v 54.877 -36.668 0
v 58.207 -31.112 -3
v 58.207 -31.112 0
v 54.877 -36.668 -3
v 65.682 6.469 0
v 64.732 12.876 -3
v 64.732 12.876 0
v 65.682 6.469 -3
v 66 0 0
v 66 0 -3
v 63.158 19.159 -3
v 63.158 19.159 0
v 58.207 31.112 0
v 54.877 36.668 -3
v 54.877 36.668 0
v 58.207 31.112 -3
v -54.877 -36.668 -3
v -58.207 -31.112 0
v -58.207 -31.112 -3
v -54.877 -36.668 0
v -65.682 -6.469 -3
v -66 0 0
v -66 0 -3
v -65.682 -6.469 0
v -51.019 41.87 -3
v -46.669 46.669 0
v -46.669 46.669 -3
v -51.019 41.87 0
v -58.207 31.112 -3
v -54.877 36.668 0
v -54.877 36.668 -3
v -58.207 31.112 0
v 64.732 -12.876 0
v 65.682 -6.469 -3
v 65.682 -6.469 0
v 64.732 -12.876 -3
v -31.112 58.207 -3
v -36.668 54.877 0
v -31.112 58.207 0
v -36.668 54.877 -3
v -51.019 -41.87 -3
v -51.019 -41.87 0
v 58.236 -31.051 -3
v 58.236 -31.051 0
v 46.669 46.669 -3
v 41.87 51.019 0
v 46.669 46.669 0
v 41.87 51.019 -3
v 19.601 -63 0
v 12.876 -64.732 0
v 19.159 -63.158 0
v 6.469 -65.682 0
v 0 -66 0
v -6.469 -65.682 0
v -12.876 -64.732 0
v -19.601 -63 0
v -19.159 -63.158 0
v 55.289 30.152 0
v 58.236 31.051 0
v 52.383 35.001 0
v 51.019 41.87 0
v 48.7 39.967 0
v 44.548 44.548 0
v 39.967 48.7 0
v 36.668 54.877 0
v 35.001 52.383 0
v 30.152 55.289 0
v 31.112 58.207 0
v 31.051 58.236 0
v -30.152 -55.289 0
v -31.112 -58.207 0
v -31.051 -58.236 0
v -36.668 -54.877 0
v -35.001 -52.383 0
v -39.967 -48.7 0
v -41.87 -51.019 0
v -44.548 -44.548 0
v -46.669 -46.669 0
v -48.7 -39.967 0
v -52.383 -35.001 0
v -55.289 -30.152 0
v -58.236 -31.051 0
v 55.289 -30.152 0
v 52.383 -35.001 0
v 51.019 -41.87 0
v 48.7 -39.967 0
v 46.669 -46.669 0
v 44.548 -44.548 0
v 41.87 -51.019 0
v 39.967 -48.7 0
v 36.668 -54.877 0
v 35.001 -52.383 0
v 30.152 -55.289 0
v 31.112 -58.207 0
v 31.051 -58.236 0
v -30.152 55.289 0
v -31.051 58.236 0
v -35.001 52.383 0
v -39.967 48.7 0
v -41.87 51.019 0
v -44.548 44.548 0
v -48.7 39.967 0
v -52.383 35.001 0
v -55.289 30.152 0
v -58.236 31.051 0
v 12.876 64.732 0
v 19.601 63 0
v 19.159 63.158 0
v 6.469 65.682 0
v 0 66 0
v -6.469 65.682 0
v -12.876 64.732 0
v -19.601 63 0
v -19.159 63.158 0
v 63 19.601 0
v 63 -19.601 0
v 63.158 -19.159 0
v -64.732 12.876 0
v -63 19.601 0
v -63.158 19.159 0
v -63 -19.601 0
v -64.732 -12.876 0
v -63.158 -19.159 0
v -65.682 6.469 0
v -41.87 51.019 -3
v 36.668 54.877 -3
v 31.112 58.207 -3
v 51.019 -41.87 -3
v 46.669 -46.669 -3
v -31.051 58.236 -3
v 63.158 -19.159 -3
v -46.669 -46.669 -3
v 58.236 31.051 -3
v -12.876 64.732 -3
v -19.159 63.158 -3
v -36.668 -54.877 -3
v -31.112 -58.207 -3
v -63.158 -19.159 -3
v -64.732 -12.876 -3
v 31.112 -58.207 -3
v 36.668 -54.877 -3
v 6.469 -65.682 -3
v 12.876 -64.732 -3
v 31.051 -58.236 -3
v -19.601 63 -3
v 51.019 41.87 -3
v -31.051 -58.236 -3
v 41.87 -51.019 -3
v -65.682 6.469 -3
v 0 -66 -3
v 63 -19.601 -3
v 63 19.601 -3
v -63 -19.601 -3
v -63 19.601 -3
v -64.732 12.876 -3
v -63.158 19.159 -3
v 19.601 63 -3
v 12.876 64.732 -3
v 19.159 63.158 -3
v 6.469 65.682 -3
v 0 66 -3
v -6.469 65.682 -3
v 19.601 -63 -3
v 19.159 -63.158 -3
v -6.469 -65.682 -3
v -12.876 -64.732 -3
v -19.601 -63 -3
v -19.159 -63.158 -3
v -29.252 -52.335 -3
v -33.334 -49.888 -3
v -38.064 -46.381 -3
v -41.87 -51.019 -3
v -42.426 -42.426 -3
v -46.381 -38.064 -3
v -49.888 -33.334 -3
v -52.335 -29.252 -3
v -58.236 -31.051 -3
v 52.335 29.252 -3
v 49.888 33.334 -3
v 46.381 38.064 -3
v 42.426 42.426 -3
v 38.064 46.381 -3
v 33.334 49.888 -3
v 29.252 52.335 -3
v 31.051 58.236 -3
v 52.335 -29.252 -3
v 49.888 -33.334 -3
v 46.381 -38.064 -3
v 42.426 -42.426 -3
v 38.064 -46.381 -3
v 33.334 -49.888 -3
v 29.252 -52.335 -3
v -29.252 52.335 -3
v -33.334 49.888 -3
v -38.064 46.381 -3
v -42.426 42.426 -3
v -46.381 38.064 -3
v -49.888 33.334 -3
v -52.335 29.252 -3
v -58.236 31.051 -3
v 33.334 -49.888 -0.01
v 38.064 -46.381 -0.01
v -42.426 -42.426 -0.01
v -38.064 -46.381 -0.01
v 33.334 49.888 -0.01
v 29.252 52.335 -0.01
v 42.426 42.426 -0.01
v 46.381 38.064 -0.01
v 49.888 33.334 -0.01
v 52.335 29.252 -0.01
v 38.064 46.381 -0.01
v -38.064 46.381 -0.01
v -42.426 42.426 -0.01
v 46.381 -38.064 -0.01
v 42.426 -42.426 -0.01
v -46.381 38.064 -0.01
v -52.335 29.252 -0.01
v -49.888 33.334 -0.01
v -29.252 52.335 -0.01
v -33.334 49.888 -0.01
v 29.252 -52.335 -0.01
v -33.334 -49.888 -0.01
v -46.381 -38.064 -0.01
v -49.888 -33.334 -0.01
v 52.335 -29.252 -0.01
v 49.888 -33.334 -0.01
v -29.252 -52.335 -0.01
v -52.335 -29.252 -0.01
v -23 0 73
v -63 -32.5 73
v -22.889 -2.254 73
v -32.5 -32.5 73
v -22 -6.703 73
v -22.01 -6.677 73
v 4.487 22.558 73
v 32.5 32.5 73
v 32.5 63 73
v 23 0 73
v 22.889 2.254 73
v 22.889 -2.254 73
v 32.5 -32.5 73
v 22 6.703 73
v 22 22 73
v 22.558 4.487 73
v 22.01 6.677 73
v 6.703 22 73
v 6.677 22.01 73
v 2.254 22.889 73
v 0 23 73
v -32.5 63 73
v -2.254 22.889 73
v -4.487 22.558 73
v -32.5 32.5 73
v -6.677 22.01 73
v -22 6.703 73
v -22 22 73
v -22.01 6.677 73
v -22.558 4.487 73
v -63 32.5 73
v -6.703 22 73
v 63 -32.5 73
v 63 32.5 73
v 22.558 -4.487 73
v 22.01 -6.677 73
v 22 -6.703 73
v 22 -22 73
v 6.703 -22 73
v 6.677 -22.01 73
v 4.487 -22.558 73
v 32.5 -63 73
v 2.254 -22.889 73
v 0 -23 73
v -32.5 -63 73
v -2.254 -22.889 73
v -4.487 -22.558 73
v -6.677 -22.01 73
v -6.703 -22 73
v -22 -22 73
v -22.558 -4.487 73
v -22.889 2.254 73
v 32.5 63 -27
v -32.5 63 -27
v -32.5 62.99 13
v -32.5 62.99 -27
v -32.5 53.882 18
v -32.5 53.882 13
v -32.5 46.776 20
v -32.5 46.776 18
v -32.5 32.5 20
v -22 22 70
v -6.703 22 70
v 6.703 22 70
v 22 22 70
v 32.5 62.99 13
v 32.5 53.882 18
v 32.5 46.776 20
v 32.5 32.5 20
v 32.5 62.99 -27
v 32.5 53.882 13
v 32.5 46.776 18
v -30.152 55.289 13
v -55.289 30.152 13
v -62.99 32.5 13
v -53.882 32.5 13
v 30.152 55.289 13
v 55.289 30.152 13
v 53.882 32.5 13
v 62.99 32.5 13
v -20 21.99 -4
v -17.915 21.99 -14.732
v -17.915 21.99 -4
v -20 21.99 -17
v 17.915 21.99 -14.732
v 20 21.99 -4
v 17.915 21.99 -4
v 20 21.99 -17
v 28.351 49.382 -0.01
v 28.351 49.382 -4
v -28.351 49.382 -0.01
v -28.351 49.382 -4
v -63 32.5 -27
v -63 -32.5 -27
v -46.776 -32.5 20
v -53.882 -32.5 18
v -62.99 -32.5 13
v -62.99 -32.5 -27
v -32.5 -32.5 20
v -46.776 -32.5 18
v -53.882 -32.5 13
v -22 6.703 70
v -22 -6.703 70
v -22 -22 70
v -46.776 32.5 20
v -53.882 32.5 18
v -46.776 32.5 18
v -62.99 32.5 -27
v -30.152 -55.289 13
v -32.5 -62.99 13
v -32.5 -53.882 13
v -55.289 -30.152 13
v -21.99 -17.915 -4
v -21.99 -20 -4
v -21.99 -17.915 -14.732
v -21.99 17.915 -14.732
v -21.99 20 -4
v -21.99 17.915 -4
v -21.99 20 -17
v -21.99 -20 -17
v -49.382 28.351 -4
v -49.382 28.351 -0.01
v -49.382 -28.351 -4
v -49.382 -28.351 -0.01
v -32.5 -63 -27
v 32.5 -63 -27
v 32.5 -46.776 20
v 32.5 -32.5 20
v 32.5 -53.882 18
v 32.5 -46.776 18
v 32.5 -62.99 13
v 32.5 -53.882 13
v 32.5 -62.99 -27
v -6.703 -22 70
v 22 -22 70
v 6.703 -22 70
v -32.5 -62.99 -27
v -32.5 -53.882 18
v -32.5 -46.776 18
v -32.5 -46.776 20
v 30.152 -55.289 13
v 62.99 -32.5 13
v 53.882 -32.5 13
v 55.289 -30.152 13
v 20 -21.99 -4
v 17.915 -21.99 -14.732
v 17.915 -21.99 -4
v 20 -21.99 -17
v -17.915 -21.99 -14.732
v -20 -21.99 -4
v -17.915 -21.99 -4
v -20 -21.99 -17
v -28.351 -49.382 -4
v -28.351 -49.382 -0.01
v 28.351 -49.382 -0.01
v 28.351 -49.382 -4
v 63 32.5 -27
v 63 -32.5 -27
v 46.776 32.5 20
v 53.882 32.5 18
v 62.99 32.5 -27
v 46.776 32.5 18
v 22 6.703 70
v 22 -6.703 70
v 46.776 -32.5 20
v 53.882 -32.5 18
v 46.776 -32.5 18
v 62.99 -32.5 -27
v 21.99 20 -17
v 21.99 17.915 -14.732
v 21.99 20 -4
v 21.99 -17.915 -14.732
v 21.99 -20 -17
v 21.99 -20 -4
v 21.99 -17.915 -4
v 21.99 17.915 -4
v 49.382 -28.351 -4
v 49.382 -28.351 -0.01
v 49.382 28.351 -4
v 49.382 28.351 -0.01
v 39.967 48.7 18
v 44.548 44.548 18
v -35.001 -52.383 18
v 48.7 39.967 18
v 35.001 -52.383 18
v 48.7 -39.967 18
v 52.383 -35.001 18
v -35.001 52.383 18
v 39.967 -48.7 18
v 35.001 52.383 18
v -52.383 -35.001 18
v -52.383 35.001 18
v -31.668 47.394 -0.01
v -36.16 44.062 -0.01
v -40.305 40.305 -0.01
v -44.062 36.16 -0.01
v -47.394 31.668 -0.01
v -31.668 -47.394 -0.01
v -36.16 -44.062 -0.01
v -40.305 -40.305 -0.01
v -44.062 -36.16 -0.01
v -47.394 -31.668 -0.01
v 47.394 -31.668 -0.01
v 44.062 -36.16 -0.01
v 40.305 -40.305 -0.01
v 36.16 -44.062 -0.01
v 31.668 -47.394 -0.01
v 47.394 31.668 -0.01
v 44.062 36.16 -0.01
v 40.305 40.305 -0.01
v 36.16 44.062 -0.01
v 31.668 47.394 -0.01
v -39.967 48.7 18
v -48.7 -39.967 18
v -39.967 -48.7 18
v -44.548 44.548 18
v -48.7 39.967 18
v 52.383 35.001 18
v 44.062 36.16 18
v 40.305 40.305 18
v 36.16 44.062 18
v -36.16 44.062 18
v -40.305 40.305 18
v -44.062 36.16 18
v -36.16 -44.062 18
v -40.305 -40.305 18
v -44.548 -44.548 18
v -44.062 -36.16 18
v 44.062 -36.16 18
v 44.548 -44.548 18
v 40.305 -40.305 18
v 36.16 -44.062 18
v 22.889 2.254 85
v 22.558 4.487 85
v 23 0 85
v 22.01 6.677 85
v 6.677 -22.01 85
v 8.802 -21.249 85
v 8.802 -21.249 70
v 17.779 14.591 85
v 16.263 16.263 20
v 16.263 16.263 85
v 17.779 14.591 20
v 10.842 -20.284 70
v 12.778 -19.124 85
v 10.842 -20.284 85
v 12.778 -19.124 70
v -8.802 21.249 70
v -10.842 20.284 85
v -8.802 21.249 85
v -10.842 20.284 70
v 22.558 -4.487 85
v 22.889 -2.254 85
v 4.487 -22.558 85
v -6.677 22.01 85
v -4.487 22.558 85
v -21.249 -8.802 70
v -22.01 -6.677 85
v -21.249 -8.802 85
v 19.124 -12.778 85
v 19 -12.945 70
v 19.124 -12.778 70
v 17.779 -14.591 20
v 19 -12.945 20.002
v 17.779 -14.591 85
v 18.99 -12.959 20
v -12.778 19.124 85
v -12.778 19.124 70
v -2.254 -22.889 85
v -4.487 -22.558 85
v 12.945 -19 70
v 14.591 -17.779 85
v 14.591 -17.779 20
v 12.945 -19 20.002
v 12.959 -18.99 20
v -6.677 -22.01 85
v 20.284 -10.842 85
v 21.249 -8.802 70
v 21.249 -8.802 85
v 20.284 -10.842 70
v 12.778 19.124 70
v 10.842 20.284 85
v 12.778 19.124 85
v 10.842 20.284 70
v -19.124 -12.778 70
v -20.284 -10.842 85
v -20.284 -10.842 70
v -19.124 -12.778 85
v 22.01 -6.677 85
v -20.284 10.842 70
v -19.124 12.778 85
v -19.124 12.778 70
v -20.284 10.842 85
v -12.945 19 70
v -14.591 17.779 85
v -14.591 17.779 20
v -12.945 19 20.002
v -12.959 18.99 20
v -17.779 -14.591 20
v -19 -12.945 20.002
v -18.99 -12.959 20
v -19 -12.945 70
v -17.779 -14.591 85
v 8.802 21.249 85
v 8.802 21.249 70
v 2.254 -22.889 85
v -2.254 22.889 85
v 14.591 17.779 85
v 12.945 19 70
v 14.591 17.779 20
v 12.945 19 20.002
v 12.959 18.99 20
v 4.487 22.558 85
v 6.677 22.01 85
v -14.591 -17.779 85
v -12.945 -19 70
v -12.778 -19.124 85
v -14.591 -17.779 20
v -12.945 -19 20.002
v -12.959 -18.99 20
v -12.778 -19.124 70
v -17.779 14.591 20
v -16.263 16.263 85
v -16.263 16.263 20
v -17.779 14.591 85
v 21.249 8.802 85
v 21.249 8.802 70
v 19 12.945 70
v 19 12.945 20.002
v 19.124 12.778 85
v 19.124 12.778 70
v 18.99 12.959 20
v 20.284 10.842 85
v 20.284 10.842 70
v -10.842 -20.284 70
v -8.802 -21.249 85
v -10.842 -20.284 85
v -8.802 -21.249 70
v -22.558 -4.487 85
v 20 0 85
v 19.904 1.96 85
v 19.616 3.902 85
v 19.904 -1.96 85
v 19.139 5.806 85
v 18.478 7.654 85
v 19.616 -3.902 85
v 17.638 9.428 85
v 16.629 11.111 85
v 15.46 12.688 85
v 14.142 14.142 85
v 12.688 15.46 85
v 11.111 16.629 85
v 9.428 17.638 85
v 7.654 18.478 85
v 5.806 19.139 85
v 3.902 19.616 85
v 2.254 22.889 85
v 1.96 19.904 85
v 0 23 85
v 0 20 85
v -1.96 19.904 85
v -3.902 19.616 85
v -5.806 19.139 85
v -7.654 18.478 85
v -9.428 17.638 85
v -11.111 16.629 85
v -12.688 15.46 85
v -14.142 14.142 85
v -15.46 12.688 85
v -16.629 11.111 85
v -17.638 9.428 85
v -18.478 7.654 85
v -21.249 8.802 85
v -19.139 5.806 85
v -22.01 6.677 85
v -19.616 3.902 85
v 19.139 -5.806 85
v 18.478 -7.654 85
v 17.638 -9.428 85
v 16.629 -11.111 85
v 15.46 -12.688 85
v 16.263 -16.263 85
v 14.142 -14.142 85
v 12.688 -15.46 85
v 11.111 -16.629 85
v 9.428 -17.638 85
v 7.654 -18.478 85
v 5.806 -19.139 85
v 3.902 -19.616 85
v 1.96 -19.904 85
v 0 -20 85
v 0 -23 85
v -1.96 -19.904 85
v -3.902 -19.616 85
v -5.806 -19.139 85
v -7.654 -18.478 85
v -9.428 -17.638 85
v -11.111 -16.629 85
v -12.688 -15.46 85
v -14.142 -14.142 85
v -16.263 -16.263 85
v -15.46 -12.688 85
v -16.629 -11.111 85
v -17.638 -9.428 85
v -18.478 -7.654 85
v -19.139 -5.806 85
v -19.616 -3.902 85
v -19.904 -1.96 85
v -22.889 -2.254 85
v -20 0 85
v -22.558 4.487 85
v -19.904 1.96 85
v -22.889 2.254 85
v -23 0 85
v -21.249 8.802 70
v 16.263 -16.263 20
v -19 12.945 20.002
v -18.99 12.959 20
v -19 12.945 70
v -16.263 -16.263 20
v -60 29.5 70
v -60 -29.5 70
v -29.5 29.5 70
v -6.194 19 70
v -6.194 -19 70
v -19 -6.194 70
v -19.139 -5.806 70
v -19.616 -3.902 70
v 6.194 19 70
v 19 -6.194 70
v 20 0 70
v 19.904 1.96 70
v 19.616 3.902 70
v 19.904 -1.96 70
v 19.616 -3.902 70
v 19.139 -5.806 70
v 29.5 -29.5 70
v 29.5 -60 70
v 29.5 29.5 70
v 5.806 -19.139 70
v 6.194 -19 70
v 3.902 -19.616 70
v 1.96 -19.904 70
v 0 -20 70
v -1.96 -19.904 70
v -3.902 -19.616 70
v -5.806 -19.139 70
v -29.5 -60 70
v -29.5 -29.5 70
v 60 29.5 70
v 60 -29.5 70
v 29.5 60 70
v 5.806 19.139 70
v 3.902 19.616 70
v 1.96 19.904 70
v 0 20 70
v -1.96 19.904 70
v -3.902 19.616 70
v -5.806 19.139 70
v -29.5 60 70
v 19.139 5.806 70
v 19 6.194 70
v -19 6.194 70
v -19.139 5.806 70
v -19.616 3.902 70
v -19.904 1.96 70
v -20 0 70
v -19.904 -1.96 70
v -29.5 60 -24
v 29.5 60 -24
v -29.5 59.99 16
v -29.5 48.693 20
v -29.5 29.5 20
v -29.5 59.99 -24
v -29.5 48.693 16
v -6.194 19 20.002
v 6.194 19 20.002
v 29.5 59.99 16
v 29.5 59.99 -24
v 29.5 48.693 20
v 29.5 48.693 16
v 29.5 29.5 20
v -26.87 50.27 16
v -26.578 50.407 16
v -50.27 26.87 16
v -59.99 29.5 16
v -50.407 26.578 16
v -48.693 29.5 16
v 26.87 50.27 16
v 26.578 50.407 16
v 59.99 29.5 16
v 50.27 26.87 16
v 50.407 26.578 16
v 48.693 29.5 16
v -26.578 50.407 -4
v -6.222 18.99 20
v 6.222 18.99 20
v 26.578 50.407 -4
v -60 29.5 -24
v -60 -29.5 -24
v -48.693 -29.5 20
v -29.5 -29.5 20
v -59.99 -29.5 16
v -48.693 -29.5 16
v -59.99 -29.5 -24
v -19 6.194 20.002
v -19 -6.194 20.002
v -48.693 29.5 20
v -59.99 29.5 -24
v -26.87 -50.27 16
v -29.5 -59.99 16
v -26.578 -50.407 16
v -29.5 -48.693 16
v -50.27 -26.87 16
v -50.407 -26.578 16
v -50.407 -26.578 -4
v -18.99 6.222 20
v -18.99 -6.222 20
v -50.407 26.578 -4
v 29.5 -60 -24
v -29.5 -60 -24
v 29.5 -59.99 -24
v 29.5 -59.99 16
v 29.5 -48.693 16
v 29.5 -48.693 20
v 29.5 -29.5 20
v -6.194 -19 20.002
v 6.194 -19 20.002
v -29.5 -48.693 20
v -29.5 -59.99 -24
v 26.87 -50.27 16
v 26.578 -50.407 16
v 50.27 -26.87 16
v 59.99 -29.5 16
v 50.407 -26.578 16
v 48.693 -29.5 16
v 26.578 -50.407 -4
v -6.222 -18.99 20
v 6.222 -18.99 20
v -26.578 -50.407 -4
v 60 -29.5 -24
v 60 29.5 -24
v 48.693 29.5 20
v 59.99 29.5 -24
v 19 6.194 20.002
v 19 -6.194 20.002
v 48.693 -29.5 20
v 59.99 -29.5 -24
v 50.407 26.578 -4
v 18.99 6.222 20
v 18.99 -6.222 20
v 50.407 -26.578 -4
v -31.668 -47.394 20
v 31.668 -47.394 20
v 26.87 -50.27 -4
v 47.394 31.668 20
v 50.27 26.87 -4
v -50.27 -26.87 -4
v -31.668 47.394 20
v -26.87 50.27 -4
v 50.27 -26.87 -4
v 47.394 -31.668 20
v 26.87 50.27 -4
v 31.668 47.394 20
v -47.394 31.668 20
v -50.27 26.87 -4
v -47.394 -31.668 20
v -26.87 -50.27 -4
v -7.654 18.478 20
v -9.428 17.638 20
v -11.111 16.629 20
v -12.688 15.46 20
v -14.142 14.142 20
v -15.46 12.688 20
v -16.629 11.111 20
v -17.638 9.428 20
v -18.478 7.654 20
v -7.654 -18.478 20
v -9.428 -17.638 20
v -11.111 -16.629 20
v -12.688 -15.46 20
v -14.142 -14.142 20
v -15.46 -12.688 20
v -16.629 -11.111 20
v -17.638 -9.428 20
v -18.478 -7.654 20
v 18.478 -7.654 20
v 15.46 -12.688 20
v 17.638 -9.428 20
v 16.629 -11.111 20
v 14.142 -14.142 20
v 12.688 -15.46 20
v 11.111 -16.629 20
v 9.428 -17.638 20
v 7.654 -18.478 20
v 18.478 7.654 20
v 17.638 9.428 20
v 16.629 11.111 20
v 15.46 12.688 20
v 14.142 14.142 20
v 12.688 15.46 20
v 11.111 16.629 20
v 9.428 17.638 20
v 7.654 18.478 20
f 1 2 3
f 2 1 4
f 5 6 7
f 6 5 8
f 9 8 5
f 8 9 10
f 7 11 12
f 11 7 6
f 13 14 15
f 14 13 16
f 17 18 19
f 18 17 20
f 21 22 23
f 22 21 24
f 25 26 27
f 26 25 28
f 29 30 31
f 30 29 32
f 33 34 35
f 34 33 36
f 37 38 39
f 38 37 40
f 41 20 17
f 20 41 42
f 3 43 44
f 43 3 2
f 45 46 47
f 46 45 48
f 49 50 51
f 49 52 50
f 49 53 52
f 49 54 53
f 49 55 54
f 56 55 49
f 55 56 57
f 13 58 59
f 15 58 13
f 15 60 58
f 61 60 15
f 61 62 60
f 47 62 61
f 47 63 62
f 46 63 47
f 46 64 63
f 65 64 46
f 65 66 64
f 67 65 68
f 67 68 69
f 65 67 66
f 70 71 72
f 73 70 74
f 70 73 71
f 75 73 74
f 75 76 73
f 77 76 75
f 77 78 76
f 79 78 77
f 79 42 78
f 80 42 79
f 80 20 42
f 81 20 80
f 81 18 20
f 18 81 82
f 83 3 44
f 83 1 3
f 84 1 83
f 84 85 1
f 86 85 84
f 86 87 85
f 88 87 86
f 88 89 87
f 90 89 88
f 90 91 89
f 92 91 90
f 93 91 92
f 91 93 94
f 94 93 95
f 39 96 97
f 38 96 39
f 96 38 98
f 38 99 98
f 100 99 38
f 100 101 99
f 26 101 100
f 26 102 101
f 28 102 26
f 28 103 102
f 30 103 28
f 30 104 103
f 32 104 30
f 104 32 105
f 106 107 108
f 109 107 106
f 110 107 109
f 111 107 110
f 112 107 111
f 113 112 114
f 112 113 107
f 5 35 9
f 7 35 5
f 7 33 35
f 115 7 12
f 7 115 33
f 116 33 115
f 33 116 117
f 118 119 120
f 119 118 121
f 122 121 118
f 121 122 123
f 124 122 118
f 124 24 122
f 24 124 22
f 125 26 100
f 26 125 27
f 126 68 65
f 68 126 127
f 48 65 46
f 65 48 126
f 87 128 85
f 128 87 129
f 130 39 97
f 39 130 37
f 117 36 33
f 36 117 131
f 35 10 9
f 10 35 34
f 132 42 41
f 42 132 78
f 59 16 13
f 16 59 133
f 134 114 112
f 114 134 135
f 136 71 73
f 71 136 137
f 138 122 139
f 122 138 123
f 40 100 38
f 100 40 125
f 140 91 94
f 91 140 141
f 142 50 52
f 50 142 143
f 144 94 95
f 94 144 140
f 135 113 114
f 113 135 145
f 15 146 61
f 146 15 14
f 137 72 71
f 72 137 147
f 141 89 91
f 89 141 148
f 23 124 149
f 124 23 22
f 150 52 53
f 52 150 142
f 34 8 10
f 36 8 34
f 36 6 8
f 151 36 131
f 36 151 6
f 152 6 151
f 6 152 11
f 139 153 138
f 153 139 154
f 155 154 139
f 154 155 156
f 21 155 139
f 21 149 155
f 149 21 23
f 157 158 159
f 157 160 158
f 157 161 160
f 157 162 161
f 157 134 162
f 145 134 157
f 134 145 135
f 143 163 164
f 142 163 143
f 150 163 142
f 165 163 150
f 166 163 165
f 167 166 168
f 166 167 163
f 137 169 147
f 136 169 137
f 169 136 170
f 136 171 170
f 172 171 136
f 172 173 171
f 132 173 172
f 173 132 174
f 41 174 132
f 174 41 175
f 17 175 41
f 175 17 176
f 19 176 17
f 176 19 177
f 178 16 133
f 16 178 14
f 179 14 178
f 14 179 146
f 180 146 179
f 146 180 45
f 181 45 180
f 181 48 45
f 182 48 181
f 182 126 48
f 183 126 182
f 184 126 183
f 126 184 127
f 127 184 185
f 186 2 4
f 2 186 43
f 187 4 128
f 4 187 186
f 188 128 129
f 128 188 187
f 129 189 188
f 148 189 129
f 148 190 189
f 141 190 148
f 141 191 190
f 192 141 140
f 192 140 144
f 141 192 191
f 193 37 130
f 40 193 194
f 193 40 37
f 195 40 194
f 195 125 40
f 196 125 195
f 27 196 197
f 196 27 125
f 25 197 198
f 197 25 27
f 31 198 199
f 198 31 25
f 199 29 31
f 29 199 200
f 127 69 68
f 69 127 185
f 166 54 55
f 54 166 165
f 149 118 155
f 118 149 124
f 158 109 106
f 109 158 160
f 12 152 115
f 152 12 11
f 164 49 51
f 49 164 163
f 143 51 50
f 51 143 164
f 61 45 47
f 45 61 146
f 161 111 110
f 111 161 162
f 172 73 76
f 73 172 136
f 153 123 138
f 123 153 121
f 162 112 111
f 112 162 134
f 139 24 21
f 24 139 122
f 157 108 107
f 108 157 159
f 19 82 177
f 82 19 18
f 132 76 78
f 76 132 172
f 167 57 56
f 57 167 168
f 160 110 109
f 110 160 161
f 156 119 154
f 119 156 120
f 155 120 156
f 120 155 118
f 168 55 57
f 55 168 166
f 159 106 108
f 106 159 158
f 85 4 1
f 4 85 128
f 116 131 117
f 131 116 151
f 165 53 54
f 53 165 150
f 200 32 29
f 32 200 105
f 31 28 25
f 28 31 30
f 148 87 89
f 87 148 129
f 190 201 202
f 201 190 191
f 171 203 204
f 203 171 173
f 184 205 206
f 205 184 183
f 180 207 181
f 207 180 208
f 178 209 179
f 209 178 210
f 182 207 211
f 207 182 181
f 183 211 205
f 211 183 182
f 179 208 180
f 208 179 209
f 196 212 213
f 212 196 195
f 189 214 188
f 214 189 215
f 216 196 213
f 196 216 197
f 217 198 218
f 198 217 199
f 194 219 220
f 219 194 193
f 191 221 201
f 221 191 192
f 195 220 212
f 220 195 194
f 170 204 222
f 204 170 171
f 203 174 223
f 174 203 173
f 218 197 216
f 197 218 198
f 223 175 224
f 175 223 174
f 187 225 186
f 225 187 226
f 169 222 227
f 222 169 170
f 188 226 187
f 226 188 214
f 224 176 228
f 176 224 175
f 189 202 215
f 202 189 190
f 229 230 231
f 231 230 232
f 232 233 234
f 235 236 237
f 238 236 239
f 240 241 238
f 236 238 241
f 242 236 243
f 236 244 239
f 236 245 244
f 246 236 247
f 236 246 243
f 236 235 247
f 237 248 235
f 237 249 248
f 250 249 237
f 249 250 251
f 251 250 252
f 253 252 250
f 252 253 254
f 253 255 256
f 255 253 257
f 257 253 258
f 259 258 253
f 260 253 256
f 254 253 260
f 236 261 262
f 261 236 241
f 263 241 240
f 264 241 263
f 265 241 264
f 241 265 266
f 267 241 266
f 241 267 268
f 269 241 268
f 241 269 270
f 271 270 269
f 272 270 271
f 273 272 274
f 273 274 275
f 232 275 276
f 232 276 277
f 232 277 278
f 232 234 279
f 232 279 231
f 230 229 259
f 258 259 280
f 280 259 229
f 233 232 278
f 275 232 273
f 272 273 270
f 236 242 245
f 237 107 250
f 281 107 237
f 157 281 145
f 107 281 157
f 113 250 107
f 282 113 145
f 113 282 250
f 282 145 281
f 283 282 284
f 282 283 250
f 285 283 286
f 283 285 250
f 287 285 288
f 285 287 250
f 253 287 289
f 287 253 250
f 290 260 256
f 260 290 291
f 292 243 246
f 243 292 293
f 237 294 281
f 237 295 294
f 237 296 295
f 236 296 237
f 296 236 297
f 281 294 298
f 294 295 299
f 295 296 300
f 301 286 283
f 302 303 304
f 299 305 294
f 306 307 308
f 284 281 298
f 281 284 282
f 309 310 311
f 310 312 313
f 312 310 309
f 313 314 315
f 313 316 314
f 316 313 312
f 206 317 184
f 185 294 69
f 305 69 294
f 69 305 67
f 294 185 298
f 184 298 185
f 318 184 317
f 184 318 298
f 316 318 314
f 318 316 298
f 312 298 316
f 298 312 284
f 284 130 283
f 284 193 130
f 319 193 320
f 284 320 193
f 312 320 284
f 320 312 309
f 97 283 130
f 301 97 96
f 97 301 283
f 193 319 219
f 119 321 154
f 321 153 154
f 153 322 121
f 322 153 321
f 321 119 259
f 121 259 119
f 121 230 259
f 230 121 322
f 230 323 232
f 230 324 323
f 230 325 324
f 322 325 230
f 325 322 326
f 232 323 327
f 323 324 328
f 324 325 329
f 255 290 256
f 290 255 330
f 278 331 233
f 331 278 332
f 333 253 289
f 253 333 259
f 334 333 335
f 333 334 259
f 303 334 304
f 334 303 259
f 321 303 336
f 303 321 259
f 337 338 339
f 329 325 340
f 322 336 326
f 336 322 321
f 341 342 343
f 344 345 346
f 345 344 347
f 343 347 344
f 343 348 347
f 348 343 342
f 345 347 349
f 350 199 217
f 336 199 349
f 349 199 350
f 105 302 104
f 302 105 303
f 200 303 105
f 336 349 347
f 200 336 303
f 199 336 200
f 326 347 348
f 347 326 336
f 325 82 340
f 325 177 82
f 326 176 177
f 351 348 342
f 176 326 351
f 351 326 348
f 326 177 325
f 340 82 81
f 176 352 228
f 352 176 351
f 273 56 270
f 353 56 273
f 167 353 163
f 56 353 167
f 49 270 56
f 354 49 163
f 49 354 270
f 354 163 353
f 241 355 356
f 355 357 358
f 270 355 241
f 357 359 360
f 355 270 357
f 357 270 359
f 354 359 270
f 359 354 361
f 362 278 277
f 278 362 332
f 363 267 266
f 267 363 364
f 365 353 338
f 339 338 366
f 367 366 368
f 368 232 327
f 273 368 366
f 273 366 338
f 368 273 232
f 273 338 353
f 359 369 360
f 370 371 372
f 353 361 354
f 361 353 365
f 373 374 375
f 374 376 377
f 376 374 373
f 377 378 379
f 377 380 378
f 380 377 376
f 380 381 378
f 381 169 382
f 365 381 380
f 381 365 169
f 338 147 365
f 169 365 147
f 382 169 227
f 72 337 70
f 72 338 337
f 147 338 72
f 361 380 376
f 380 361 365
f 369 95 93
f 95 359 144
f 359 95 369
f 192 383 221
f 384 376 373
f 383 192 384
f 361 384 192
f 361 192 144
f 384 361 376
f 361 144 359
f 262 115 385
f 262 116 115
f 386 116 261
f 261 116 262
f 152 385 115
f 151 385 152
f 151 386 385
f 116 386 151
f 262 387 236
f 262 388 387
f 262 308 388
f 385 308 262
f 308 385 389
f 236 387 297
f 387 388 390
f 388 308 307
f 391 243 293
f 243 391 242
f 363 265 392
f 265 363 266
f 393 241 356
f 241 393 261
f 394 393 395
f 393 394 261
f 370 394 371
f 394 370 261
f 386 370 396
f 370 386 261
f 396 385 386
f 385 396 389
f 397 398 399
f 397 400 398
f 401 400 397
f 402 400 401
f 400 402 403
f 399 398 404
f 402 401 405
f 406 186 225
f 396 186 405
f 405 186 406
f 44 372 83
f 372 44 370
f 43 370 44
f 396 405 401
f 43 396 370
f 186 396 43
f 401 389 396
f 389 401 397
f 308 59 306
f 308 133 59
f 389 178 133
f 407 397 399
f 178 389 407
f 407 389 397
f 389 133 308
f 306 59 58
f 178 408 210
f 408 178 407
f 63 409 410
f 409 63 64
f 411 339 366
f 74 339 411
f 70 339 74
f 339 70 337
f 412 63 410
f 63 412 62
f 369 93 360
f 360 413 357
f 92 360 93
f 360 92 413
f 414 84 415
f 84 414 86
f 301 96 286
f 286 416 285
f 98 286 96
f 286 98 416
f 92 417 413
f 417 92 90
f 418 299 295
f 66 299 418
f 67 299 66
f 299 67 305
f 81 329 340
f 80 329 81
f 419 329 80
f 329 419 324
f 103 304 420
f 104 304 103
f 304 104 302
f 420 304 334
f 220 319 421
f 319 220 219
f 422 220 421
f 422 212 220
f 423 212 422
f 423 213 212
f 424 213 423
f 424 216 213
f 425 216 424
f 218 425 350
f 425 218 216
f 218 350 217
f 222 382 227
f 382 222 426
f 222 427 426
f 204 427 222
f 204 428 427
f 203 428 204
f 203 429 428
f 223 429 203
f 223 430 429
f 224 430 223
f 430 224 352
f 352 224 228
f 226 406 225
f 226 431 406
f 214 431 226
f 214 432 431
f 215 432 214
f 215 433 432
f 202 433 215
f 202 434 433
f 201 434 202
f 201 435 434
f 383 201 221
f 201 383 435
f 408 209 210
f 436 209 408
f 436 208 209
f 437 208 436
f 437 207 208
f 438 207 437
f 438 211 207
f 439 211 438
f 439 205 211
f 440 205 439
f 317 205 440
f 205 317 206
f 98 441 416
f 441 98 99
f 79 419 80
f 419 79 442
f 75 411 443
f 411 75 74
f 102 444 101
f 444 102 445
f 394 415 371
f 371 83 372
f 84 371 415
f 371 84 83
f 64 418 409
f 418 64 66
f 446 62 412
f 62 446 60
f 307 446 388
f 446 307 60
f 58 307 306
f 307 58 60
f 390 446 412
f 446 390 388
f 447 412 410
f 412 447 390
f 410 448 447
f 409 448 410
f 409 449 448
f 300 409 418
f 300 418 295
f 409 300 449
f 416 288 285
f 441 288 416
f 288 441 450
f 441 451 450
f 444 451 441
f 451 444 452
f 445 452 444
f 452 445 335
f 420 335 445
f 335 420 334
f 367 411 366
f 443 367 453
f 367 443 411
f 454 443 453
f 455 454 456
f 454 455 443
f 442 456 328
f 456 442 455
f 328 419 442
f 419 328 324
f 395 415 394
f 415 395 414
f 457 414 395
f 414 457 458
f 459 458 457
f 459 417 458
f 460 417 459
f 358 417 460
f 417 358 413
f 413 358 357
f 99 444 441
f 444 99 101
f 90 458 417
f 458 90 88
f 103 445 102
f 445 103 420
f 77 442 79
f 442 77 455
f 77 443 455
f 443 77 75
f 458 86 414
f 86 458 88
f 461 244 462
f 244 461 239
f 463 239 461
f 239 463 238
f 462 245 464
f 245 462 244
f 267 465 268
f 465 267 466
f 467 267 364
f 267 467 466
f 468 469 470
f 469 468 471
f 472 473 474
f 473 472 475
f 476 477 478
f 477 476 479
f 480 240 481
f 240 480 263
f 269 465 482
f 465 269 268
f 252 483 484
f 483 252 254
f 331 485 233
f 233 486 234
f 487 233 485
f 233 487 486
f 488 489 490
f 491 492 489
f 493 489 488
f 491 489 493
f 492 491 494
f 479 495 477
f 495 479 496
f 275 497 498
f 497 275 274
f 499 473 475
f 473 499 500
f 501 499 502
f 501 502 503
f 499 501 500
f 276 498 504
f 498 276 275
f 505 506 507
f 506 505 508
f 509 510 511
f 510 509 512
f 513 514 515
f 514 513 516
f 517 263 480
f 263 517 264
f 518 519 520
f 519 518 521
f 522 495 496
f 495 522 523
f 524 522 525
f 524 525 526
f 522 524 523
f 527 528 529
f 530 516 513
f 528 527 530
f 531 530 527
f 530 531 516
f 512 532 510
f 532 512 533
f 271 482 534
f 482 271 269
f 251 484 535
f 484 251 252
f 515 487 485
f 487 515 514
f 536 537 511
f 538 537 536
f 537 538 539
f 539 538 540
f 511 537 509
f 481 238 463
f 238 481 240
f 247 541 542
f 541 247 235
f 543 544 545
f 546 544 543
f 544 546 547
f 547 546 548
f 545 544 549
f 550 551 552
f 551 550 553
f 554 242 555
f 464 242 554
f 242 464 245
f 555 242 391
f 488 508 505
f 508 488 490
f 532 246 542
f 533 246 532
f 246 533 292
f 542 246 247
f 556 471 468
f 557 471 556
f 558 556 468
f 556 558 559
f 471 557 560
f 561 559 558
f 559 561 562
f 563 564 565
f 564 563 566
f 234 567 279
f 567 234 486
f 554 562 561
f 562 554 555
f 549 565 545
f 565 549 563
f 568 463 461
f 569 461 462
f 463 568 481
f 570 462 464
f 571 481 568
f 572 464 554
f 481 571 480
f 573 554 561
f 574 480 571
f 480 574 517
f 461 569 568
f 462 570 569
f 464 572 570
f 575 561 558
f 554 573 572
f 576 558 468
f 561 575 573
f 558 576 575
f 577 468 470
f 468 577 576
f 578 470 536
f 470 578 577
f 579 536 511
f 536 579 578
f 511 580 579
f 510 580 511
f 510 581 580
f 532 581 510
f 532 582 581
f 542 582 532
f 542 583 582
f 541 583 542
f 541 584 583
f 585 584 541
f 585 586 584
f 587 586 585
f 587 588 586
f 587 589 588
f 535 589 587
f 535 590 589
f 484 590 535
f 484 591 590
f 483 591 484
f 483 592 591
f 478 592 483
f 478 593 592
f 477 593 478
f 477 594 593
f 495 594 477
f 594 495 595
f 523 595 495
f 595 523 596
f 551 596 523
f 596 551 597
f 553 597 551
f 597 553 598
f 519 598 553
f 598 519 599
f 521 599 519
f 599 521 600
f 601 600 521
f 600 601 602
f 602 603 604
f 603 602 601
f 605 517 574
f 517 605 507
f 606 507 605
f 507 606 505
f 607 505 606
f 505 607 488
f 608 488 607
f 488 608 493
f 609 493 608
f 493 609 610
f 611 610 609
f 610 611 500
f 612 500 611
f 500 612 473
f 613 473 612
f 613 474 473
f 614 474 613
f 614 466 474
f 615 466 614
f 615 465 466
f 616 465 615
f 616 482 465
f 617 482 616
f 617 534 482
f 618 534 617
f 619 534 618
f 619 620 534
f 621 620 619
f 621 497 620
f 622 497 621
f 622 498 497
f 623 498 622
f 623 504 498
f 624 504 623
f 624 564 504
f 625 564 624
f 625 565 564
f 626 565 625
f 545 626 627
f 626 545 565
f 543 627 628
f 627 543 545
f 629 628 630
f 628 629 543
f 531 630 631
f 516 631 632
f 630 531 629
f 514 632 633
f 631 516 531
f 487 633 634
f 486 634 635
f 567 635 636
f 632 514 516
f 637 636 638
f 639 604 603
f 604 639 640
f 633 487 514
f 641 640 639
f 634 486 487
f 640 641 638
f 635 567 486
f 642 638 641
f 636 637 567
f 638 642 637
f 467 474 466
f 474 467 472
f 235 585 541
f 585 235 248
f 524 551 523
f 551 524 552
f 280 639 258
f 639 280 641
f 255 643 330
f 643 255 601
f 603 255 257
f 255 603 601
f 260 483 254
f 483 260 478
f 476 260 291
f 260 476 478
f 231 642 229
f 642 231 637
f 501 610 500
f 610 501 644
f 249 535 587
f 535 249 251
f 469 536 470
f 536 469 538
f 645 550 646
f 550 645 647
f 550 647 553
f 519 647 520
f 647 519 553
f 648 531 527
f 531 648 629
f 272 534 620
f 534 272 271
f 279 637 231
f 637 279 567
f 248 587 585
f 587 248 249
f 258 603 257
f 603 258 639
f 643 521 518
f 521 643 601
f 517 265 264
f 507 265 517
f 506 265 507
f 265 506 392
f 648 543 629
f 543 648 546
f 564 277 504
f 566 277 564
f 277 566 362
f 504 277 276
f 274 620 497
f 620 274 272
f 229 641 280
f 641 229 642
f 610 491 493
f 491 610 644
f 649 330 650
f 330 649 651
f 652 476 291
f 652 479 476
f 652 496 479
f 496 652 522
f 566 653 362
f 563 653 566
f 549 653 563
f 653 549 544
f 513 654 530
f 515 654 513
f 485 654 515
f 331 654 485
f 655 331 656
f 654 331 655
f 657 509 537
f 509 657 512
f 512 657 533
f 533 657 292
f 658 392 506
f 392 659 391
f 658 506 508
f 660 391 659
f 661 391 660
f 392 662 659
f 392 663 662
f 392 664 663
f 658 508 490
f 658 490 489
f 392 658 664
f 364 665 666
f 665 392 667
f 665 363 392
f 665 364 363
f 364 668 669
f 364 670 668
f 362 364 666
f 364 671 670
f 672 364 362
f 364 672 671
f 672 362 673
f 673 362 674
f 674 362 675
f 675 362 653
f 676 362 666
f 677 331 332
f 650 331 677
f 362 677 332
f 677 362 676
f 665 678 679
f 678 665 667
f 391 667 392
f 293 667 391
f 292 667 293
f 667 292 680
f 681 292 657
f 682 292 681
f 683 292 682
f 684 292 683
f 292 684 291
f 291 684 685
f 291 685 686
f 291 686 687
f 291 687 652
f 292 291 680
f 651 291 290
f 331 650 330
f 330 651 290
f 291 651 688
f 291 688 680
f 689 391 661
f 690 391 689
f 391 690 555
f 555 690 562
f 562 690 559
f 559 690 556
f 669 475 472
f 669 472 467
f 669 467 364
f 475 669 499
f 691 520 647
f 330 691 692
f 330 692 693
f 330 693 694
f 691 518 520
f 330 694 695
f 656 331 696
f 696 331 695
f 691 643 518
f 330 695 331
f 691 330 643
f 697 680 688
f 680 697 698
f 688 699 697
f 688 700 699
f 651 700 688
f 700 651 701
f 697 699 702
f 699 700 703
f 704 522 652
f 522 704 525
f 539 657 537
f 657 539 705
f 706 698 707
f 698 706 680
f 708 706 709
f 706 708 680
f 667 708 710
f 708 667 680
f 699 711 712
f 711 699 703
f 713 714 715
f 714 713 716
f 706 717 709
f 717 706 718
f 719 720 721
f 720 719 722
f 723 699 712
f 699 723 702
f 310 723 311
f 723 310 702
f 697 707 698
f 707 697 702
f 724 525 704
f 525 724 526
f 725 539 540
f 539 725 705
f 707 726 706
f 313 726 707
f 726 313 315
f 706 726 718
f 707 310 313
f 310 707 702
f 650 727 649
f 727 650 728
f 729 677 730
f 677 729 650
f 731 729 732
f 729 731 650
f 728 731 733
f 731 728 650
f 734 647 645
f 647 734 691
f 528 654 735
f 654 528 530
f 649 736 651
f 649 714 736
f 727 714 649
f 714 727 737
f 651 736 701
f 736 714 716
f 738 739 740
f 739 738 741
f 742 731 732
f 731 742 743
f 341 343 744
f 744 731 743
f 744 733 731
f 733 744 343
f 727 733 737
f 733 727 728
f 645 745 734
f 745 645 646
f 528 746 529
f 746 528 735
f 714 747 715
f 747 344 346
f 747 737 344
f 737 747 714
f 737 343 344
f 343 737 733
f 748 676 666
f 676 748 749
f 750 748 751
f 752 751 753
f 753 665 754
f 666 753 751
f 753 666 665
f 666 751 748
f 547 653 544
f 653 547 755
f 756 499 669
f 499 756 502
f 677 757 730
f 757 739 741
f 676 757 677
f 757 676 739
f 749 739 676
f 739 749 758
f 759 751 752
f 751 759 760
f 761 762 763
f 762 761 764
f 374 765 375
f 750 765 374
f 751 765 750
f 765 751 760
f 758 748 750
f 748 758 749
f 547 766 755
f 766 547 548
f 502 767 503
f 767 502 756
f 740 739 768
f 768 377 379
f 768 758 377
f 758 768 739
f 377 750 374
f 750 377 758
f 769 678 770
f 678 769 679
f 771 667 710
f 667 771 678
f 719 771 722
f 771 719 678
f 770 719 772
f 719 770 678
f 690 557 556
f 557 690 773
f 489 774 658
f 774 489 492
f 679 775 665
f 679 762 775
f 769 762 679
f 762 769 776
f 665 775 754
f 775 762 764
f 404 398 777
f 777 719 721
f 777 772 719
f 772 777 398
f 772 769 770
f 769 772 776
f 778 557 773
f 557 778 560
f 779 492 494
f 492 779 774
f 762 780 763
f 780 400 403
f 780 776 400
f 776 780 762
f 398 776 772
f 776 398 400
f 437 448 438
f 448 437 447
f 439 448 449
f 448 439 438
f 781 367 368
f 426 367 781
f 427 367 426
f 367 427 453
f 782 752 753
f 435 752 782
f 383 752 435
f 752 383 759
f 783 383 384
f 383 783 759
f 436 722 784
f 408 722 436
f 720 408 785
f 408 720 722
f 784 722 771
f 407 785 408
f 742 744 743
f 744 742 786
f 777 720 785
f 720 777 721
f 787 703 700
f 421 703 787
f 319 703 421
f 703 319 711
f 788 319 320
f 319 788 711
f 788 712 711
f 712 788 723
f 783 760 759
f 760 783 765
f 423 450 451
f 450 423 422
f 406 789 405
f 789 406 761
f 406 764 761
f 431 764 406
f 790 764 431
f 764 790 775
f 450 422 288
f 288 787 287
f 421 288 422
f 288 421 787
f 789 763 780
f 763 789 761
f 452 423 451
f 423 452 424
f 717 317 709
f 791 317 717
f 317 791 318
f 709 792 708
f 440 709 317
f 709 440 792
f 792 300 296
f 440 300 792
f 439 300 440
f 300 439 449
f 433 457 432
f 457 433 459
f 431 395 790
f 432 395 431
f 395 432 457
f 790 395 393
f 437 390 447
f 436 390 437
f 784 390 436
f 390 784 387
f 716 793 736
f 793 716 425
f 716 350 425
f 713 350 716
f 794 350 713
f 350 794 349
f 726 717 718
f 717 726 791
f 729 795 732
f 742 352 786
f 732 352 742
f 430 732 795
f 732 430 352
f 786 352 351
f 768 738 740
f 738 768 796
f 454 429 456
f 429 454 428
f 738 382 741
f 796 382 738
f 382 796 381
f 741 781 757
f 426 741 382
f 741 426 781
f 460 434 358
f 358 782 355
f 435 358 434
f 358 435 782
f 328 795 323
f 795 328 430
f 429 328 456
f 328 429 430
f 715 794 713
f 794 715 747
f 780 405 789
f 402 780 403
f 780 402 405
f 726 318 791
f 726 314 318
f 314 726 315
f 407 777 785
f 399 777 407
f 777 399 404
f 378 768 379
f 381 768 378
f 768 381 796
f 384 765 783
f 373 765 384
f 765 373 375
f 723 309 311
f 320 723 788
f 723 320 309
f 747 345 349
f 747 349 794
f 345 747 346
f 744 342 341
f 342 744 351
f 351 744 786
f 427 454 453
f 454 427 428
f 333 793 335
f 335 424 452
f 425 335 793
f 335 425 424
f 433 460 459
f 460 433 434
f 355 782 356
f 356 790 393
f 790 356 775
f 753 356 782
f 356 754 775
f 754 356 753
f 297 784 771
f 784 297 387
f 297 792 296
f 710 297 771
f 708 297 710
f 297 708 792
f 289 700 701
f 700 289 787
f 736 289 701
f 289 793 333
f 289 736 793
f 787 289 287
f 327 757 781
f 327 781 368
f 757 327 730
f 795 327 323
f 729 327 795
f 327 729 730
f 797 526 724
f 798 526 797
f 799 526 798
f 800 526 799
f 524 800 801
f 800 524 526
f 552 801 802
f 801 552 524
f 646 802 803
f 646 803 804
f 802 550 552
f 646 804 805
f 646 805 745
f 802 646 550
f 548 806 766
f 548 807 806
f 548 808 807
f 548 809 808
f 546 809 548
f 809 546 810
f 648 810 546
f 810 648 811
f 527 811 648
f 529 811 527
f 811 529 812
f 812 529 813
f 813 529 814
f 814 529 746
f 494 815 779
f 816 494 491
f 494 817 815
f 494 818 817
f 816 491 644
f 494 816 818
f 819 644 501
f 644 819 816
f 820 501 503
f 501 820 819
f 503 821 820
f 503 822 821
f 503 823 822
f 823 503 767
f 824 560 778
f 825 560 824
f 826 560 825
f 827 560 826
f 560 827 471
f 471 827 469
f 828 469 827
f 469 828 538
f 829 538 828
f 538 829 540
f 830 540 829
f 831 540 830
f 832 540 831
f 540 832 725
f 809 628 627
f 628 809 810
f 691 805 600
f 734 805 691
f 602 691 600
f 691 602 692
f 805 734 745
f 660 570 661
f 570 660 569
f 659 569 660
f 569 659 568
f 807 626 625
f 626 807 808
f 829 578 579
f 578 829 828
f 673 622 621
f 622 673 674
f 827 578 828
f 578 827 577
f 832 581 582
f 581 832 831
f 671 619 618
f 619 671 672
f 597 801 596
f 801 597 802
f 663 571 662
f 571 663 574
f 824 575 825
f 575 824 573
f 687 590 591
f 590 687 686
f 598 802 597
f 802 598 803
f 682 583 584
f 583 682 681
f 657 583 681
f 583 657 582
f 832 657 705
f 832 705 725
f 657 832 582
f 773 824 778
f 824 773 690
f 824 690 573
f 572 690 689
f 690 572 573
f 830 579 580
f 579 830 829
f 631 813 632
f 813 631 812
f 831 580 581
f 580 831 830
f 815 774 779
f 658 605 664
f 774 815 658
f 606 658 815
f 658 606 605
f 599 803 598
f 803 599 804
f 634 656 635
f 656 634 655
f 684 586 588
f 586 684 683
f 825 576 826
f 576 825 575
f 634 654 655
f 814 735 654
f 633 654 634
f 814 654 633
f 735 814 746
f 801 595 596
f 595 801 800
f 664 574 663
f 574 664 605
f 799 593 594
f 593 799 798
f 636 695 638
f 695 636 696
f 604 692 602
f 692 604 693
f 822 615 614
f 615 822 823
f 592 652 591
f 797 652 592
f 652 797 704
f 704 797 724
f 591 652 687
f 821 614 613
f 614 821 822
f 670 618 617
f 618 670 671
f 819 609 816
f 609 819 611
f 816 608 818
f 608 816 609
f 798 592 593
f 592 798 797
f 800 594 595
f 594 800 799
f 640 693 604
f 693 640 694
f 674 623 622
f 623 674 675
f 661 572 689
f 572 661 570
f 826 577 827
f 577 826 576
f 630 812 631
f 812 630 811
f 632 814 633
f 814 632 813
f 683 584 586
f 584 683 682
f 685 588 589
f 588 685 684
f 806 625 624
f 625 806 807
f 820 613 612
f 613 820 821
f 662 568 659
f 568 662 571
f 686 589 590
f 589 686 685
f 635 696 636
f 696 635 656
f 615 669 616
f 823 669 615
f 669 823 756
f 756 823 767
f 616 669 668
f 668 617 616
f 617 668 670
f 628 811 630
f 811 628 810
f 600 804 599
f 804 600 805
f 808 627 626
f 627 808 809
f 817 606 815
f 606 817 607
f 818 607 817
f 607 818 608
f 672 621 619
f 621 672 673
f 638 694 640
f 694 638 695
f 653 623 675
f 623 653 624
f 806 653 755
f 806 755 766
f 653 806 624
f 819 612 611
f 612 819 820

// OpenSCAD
// ===========================================================================
// HULL-FRAME COORDINATE STANDARD - Rev R1 (2026-06-11).  See CLAUDE.md.
//   Hull frame (canonical for ALL design artifacts): X = +port (left),
//   Y = +aft (back), Z = +dorsal (up); origin = SerenityAssembly.FCStd
//   world origin.  Primary-component STLs published to airframe/stls/
//   are stored directly in hull frame, baked by tools/bake_hull_frame.py
//   (marker 'SerenityUAV HULL-FRAME R1' in the binary STL header).
//   NEVER re-bake a mesh derived from an already-baked file.
//   This file:
//     Part-local frame.  DEFERRED - Phase 11 (aft fuselage EDF).  On
//     integration, position in hull frame per the validated assembly and
//     bake or place explicitly; stations quoted from nose convert to hull
//     Y via nose tip at hull Y = -305.6 mm.
// ===========================================================================
// s_aft_edf_plenum.scad
// 4-to-1 cross-shaped internal air manifold for Serenity Rev N 24" hull
// Routes airflow from 4 radial neck scoops (station ~310mm) to the 120mm
// fuselage EDF (fan face at station ~430mm, inside Panel F engine bell).
// Print in PETG; bond to intake frame duct arms and EDF mount ring.
//
// Coordinate origin: centre of EDF fan face (output end).
// +Z = forward (toward nose, toward scoop inlets); −Z = aft (toward EDF fan).

// ── Dimensions ───────────────────────────────────────────────────────────────
EDF_D    = 120;    // 120mm EDF outer diameter
EDF_HUB  =  28;    // EDF hub/spinner diameter (annular fan)
ARM_W    =  65;    // duct arm width  (matches scoop window)
ARM_H    =  60;    // duct arm height (matches scoop window)
WALL     =   3;    // duct wall thickness [mm]
ARM_LEN  =  40;    // length of each rectangular inlet arm
TAPER_L  =  40;    // transition / merger zone length
TOTAL_L  =  80;    // ARM_LEN + TAPER_L
CENTRE_R =  20;    // radius of central merger zone (cross-bar where arms meet)

$fn = 64;

// ── Main module ───────────────────────────────────────────────────────────────
// Note: _edf_lip() is included inside the union so it shares the same boolean
// context as the outlet bell.  Placing it outside the difference() creates a
// touching face at Z=0 (lip top == bell bottom) which yields a non-manifold mesh.
module aft_edf_plenum() {
    difference() {
        union() {
            // EDF outlet bell: circular duct matching EDF OD
            _edf_outlet_bell();
            // EDF retaining lip ring (stands proud ~3mm on aft face for bonding).
            // Merged with the bell in this union to avoid touching faces at Z=0.
            _edf_lip();
            // Four tapered arms transitioning to rectangular inlets
            for (a = [0, 90, 180, 270])
                rotate([0, 0, a]) _inlet_arm();
            // Central merger hub connecting all four arms
            _merger_hub();
        }
        // Hollow out — keep WALL-thick walls everywhere
        union() {
            // Inner EDF bore: extend to cover lip region (Z=-3) so the lip is also
            // hollowed.  Height = 20+3+1 covers Z=-4..Z=20, clearing the full lip.
            translate([0, 0, -(3 + 1)])
            cylinder(h = 20 + 3 + 1, d = EDF_D - 2*WALL);
            // Hollow each arm interior
            for (a = [0, 90, 180, 270])
                rotate([0, 0, a]) _inlet_arm_hollow();
            // Hollow merger hub
            _merger_hub_hollow();
        }
    }
}

// Outlet bell: circular PETG sleeve bonding over EDF casing.
// Starts at Z=-0.01 (not Z=0) to avoid a coplanar face with the _edf_lip()
// top face at Z=0 — coincident faces at Z=0 produce non-manifold CGAL topology.
module _edf_outlet_bell() {
    translate([0, 0, -0.01])
    cylinder(h = 18 + 0.01, d = EDF_D + 2*WALL);
}

module _edf_lip() {
    translate([0, 0, -3])
    difference() {
        cylinder(h = 3, d = EDF_D + 2*WALL + 6);
        cylinder(h = 3 + 1, d = EDF_D, center = false);
    }
}

// One tapered inlet arm pointing in +Y before rotation.
// ARM_LEN+1 / TAPER_L+1: each arm solid penetrates 1 mm past the hub outer wall
// (CENTRE_R+WALL = 23 mm) so the union has no touching/coplanar face at that boundary.
// The hollow (_inlet_arm_hollow) already uses the same +1 offset from EDF_D/2 (not
// EDF_D/2+WALL), keeping 3 mm wall thickness throughout.
module _inlet_arm() {
    // Rectangular inlet section — extends 1 mm into hub outer wall
    translate([0, EDF_D/2 + WALL, TOTAL_L - ARM_LEN + WALL])
    rotate([90, 0, 0])
    linear_extrude(height = ARM_LEN + 1)
    square([ARM_W, ARM_H], center = true);

    // Tapered transition: rectangular inlet → square merger zone; 1 mm hub overlap
    translate([0, EDF_D/2 + WALL, WALL])
    rotate([90, 0, 0])
    _taper_solid(ARM_W, ARM_H, CENTRE_R * 2, CENTRE_R * 2, TAPER_L + 1);
}

module _inlet_arm_hollow() {
    IW = ARM_W - 2*WALL;
    IH = ARM_H - 2*WALL;
    translate([0, EDF_D/2, TOTAL_L - ARM_LEN + WALL])
    rotate([90, 0, 0])
    linear_extrude(height = ARM_LEN + 1)
    square([IW, IH], center = true);

    translate([0, EDF_D/2, WALL])
    rotate([90, 0, 0])
    _taper_solid(IW, IH, (CENTRE_R - WALL)*2, (CENTRE_R - WALL)*2, TAPER_L + 1);
}

// Central merger hub: hemisphere-like volume where 4 arms converge
module _merger_hub() {
    translate([0, 0, WALL])
    cylinder(h = TOTAL_L + 2, d = CENTRE_R * 2 + WALL * 2);
}

module _merger_hub_hollow() {
    translate([0, 0, 0])
    cylinder(h = TOTAL_L + 10, d = CENTRE_R * 2);
}

// Parametric linear taper between two rectangles (for use with rotate([90,0,0]))
// Z-axis is the taper axis here; actual orientation handled by caller's rotate
module _taper_solid(w1, h1, w2, h2, length) {
    hull() {
        linear_extrude(height = 0.01)
        square([w1, h1], center = true);
        translate([0, 0, length])
        linear_extrude(height = 0.01)
        square([w2, h2], center = true);
    }
}

aft_edf_plenum();
